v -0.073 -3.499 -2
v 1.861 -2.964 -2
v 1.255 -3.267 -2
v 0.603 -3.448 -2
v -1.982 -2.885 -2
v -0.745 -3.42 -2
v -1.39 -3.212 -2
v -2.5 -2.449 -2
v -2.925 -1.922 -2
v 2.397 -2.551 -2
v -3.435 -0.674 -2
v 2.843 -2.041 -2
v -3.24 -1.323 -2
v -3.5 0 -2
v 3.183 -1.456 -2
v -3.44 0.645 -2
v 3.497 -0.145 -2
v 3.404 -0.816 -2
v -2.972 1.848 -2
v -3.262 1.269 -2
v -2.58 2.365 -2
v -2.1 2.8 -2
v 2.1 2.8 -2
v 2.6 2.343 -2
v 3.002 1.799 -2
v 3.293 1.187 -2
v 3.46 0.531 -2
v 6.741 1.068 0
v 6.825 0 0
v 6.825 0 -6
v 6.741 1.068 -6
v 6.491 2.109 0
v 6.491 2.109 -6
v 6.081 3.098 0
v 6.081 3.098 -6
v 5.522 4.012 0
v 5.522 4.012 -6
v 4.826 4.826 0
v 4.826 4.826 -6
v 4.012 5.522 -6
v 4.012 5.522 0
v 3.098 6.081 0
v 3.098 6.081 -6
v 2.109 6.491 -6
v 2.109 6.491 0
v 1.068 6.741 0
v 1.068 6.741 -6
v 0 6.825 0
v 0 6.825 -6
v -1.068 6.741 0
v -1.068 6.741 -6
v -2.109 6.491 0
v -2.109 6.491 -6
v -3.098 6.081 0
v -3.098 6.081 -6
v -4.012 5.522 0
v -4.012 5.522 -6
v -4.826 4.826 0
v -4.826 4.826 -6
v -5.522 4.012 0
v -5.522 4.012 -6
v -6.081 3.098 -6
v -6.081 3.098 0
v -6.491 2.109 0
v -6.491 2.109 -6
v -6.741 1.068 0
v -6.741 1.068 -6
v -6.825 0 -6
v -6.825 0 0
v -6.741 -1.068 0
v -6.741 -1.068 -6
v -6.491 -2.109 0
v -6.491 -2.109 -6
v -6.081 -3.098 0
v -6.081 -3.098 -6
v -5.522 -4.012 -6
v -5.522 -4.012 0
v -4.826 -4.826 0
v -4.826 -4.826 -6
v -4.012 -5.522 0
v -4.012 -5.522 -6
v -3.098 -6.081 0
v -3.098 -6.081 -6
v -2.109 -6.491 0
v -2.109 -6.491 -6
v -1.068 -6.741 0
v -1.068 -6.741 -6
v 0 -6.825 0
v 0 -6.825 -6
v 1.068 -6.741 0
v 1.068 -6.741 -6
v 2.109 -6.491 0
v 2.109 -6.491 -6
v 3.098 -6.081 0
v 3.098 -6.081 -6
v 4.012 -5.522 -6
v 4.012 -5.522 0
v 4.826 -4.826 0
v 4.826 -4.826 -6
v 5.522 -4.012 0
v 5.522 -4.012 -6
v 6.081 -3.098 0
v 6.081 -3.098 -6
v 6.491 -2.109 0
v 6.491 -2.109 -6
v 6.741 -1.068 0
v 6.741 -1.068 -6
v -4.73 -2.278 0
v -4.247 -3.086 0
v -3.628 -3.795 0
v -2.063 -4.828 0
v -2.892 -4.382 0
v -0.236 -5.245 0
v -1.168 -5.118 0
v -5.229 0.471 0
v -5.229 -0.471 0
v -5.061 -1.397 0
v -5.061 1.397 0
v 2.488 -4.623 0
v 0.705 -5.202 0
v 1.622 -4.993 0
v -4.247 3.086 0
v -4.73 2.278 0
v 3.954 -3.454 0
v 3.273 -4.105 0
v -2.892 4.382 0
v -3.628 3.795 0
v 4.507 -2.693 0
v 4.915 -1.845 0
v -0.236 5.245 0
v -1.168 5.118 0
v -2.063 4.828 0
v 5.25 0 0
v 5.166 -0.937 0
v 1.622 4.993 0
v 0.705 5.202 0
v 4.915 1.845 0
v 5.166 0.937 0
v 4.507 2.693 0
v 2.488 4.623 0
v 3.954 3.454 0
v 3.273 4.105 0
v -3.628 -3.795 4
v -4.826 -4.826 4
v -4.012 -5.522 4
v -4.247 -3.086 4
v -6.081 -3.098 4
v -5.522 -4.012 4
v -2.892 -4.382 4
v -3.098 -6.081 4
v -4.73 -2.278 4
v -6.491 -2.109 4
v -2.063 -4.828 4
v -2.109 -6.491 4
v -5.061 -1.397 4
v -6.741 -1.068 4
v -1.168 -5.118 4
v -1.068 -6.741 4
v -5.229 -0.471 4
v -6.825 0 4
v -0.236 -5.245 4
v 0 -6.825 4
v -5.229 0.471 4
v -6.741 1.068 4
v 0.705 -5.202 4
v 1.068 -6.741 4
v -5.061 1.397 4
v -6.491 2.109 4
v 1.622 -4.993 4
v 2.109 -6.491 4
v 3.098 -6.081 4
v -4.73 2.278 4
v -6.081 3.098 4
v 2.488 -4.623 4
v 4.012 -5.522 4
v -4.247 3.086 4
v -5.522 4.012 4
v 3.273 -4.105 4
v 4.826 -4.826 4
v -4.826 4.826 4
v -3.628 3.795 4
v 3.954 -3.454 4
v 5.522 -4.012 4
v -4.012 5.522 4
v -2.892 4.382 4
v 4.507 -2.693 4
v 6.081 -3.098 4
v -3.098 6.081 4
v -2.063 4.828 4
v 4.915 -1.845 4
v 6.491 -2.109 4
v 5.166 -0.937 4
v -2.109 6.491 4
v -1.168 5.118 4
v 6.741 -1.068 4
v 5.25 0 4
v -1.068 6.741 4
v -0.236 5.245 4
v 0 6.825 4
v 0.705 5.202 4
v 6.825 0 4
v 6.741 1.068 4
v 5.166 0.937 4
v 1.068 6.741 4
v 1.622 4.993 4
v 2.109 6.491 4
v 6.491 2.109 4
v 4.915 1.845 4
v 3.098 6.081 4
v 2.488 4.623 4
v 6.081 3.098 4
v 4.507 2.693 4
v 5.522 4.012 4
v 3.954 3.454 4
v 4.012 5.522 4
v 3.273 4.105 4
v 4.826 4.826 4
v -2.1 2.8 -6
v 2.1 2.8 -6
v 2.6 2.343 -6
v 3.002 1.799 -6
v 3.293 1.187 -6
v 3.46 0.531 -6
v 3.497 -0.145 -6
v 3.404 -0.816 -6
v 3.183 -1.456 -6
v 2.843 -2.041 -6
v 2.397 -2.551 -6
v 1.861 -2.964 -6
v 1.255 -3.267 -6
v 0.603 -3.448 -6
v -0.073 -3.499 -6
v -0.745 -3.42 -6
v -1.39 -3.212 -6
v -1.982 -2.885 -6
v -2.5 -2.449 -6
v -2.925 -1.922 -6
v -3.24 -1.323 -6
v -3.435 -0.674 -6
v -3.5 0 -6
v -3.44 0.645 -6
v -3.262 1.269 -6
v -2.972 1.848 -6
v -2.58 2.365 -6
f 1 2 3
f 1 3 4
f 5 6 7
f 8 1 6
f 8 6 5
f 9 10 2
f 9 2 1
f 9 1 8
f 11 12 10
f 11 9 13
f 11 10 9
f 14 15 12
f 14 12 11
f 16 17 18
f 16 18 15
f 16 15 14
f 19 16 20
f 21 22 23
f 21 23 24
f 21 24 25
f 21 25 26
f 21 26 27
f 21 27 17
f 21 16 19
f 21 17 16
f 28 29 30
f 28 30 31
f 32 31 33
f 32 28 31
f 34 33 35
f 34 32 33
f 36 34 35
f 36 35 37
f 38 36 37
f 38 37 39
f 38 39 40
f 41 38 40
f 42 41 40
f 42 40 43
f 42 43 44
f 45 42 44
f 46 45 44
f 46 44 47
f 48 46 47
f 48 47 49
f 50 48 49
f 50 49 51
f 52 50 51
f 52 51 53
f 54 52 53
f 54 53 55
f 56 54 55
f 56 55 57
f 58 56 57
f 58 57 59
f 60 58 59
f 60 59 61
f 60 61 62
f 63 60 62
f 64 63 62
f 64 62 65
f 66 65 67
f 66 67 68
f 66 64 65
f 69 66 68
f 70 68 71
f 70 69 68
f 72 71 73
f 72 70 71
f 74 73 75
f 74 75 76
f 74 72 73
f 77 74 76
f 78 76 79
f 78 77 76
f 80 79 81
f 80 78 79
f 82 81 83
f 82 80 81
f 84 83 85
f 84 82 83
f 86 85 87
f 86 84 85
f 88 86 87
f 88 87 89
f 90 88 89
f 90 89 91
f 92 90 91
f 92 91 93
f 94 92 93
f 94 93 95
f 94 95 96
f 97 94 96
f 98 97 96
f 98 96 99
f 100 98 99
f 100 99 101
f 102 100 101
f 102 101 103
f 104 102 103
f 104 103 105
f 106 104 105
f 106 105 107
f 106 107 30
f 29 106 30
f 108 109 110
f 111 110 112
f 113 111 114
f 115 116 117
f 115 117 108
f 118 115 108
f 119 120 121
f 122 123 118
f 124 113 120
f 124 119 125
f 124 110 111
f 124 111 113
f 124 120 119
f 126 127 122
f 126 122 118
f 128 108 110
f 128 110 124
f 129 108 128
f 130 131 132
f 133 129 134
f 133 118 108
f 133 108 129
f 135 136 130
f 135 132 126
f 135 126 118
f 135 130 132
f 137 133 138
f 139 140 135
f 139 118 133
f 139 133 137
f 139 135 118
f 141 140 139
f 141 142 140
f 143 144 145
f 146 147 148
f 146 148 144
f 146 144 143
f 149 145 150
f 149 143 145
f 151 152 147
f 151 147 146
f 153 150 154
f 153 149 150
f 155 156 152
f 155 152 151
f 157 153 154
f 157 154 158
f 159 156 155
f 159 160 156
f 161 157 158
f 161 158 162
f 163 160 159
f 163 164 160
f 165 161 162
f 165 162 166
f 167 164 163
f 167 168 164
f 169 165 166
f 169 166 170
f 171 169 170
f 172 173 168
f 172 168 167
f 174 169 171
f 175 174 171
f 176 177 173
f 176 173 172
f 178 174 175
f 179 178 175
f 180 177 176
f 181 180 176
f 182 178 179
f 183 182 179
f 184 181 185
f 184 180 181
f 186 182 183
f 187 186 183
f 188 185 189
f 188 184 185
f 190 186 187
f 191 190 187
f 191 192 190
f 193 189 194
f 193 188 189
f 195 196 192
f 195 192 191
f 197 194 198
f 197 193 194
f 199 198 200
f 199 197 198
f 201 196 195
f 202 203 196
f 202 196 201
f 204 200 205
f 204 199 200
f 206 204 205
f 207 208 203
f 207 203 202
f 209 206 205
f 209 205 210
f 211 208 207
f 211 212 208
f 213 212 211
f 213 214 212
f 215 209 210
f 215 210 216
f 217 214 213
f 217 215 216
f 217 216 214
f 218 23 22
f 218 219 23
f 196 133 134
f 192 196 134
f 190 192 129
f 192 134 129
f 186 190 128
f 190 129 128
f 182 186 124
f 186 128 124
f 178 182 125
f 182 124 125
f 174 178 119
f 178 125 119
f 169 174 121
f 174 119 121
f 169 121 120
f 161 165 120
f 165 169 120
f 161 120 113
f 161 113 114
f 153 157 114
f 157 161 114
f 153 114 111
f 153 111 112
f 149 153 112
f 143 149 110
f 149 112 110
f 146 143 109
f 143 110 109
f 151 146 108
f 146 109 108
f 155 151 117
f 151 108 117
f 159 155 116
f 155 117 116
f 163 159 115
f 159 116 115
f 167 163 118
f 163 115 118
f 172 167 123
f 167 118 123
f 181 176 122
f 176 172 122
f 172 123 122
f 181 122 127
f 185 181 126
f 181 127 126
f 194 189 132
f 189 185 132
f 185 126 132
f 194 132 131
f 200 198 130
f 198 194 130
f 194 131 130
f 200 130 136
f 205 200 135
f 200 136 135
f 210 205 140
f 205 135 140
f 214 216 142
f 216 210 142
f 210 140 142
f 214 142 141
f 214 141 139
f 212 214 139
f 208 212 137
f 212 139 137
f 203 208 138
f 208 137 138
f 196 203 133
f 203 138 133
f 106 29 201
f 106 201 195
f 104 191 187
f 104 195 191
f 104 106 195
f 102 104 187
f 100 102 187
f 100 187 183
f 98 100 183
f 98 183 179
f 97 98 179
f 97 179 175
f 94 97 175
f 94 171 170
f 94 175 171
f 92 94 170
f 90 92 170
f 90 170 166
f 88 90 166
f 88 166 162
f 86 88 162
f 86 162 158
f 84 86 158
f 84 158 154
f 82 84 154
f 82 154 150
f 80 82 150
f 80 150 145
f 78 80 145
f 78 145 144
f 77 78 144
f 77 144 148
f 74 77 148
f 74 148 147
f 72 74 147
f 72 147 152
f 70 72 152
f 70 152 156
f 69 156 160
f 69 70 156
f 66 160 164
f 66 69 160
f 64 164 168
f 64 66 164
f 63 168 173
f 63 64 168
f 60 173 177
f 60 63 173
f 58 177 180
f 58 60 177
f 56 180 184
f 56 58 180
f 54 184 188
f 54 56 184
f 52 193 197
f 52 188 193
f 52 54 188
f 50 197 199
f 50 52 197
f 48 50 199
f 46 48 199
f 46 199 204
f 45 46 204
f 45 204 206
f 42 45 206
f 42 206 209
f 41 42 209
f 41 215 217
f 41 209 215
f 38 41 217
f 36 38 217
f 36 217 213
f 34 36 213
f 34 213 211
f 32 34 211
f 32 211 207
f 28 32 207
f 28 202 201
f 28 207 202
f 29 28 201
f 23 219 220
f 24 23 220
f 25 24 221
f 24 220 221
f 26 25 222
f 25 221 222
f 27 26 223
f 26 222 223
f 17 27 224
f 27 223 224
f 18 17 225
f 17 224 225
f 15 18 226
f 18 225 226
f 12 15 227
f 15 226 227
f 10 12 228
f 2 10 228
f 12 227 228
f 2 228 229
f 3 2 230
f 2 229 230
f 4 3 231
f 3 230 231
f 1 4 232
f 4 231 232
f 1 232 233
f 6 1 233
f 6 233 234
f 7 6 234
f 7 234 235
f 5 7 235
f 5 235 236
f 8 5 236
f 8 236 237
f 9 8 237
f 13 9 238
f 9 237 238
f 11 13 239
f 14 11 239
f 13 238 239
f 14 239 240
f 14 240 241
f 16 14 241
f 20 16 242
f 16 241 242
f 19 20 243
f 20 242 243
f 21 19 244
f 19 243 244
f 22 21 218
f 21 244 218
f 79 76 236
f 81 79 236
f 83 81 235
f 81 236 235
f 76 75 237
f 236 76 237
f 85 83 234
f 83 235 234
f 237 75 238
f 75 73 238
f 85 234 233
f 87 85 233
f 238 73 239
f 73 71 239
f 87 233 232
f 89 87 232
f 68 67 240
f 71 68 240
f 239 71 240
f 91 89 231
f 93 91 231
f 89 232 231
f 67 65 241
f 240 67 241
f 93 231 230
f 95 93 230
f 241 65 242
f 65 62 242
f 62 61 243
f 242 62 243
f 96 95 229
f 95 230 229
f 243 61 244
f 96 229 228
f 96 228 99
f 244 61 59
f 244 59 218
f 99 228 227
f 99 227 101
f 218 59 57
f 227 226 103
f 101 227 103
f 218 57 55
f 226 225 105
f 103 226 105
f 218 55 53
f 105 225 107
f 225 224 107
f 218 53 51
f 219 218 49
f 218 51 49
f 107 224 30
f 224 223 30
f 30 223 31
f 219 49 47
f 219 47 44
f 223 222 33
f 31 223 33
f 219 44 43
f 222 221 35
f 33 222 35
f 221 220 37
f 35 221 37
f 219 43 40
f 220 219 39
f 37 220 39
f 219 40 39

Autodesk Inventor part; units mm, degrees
ref_plane "YZ Plane" through (0, 0, 0) normal (1, 0, 0) x (0, 1, 0)
ref_plane "XZ Plane" through (0, 0, 0) normal (0, 1, 0) x (-1, 0, 0)
ref_plane "XY Plane" through (0, 0, 0) normal (0, 0, 1) x (1, 0, 0)
sketch "Sketch1" plane through (0, 0, 0) normal (0, 0, 1) x (1, 0, 0)
  circle A0 centre (0, 0) radius 5.25
  circle A1 centre (0, 0) radius 6.825
  dimension "d0" = 10.5
  dimension "d1" = 13.65
extrude "Extrusion1" add sketch "Sketch1" along normal blind 4
extrude "Extrusion2" add sketch "Sketch1" against normal blind 6 contours A0 | A1
sketch "Sketch2" plane through (0, 0, -6) normal (0, 0, -1) x (-1, 0, 0)
  circle A0 centre (0, 0) radius 3.5
  line L0 (-2.1, 2.8) -> (2.1, 2.8)
  dimension "d6" = 7
  dimension "d7" = 0.7
extrude "Extrusion3" cut sketch "Sketch2" against normal blind 4 contours A0 L0 picked at (-0.6426, 0.8929)
properties part number "Shaft Coupler"
